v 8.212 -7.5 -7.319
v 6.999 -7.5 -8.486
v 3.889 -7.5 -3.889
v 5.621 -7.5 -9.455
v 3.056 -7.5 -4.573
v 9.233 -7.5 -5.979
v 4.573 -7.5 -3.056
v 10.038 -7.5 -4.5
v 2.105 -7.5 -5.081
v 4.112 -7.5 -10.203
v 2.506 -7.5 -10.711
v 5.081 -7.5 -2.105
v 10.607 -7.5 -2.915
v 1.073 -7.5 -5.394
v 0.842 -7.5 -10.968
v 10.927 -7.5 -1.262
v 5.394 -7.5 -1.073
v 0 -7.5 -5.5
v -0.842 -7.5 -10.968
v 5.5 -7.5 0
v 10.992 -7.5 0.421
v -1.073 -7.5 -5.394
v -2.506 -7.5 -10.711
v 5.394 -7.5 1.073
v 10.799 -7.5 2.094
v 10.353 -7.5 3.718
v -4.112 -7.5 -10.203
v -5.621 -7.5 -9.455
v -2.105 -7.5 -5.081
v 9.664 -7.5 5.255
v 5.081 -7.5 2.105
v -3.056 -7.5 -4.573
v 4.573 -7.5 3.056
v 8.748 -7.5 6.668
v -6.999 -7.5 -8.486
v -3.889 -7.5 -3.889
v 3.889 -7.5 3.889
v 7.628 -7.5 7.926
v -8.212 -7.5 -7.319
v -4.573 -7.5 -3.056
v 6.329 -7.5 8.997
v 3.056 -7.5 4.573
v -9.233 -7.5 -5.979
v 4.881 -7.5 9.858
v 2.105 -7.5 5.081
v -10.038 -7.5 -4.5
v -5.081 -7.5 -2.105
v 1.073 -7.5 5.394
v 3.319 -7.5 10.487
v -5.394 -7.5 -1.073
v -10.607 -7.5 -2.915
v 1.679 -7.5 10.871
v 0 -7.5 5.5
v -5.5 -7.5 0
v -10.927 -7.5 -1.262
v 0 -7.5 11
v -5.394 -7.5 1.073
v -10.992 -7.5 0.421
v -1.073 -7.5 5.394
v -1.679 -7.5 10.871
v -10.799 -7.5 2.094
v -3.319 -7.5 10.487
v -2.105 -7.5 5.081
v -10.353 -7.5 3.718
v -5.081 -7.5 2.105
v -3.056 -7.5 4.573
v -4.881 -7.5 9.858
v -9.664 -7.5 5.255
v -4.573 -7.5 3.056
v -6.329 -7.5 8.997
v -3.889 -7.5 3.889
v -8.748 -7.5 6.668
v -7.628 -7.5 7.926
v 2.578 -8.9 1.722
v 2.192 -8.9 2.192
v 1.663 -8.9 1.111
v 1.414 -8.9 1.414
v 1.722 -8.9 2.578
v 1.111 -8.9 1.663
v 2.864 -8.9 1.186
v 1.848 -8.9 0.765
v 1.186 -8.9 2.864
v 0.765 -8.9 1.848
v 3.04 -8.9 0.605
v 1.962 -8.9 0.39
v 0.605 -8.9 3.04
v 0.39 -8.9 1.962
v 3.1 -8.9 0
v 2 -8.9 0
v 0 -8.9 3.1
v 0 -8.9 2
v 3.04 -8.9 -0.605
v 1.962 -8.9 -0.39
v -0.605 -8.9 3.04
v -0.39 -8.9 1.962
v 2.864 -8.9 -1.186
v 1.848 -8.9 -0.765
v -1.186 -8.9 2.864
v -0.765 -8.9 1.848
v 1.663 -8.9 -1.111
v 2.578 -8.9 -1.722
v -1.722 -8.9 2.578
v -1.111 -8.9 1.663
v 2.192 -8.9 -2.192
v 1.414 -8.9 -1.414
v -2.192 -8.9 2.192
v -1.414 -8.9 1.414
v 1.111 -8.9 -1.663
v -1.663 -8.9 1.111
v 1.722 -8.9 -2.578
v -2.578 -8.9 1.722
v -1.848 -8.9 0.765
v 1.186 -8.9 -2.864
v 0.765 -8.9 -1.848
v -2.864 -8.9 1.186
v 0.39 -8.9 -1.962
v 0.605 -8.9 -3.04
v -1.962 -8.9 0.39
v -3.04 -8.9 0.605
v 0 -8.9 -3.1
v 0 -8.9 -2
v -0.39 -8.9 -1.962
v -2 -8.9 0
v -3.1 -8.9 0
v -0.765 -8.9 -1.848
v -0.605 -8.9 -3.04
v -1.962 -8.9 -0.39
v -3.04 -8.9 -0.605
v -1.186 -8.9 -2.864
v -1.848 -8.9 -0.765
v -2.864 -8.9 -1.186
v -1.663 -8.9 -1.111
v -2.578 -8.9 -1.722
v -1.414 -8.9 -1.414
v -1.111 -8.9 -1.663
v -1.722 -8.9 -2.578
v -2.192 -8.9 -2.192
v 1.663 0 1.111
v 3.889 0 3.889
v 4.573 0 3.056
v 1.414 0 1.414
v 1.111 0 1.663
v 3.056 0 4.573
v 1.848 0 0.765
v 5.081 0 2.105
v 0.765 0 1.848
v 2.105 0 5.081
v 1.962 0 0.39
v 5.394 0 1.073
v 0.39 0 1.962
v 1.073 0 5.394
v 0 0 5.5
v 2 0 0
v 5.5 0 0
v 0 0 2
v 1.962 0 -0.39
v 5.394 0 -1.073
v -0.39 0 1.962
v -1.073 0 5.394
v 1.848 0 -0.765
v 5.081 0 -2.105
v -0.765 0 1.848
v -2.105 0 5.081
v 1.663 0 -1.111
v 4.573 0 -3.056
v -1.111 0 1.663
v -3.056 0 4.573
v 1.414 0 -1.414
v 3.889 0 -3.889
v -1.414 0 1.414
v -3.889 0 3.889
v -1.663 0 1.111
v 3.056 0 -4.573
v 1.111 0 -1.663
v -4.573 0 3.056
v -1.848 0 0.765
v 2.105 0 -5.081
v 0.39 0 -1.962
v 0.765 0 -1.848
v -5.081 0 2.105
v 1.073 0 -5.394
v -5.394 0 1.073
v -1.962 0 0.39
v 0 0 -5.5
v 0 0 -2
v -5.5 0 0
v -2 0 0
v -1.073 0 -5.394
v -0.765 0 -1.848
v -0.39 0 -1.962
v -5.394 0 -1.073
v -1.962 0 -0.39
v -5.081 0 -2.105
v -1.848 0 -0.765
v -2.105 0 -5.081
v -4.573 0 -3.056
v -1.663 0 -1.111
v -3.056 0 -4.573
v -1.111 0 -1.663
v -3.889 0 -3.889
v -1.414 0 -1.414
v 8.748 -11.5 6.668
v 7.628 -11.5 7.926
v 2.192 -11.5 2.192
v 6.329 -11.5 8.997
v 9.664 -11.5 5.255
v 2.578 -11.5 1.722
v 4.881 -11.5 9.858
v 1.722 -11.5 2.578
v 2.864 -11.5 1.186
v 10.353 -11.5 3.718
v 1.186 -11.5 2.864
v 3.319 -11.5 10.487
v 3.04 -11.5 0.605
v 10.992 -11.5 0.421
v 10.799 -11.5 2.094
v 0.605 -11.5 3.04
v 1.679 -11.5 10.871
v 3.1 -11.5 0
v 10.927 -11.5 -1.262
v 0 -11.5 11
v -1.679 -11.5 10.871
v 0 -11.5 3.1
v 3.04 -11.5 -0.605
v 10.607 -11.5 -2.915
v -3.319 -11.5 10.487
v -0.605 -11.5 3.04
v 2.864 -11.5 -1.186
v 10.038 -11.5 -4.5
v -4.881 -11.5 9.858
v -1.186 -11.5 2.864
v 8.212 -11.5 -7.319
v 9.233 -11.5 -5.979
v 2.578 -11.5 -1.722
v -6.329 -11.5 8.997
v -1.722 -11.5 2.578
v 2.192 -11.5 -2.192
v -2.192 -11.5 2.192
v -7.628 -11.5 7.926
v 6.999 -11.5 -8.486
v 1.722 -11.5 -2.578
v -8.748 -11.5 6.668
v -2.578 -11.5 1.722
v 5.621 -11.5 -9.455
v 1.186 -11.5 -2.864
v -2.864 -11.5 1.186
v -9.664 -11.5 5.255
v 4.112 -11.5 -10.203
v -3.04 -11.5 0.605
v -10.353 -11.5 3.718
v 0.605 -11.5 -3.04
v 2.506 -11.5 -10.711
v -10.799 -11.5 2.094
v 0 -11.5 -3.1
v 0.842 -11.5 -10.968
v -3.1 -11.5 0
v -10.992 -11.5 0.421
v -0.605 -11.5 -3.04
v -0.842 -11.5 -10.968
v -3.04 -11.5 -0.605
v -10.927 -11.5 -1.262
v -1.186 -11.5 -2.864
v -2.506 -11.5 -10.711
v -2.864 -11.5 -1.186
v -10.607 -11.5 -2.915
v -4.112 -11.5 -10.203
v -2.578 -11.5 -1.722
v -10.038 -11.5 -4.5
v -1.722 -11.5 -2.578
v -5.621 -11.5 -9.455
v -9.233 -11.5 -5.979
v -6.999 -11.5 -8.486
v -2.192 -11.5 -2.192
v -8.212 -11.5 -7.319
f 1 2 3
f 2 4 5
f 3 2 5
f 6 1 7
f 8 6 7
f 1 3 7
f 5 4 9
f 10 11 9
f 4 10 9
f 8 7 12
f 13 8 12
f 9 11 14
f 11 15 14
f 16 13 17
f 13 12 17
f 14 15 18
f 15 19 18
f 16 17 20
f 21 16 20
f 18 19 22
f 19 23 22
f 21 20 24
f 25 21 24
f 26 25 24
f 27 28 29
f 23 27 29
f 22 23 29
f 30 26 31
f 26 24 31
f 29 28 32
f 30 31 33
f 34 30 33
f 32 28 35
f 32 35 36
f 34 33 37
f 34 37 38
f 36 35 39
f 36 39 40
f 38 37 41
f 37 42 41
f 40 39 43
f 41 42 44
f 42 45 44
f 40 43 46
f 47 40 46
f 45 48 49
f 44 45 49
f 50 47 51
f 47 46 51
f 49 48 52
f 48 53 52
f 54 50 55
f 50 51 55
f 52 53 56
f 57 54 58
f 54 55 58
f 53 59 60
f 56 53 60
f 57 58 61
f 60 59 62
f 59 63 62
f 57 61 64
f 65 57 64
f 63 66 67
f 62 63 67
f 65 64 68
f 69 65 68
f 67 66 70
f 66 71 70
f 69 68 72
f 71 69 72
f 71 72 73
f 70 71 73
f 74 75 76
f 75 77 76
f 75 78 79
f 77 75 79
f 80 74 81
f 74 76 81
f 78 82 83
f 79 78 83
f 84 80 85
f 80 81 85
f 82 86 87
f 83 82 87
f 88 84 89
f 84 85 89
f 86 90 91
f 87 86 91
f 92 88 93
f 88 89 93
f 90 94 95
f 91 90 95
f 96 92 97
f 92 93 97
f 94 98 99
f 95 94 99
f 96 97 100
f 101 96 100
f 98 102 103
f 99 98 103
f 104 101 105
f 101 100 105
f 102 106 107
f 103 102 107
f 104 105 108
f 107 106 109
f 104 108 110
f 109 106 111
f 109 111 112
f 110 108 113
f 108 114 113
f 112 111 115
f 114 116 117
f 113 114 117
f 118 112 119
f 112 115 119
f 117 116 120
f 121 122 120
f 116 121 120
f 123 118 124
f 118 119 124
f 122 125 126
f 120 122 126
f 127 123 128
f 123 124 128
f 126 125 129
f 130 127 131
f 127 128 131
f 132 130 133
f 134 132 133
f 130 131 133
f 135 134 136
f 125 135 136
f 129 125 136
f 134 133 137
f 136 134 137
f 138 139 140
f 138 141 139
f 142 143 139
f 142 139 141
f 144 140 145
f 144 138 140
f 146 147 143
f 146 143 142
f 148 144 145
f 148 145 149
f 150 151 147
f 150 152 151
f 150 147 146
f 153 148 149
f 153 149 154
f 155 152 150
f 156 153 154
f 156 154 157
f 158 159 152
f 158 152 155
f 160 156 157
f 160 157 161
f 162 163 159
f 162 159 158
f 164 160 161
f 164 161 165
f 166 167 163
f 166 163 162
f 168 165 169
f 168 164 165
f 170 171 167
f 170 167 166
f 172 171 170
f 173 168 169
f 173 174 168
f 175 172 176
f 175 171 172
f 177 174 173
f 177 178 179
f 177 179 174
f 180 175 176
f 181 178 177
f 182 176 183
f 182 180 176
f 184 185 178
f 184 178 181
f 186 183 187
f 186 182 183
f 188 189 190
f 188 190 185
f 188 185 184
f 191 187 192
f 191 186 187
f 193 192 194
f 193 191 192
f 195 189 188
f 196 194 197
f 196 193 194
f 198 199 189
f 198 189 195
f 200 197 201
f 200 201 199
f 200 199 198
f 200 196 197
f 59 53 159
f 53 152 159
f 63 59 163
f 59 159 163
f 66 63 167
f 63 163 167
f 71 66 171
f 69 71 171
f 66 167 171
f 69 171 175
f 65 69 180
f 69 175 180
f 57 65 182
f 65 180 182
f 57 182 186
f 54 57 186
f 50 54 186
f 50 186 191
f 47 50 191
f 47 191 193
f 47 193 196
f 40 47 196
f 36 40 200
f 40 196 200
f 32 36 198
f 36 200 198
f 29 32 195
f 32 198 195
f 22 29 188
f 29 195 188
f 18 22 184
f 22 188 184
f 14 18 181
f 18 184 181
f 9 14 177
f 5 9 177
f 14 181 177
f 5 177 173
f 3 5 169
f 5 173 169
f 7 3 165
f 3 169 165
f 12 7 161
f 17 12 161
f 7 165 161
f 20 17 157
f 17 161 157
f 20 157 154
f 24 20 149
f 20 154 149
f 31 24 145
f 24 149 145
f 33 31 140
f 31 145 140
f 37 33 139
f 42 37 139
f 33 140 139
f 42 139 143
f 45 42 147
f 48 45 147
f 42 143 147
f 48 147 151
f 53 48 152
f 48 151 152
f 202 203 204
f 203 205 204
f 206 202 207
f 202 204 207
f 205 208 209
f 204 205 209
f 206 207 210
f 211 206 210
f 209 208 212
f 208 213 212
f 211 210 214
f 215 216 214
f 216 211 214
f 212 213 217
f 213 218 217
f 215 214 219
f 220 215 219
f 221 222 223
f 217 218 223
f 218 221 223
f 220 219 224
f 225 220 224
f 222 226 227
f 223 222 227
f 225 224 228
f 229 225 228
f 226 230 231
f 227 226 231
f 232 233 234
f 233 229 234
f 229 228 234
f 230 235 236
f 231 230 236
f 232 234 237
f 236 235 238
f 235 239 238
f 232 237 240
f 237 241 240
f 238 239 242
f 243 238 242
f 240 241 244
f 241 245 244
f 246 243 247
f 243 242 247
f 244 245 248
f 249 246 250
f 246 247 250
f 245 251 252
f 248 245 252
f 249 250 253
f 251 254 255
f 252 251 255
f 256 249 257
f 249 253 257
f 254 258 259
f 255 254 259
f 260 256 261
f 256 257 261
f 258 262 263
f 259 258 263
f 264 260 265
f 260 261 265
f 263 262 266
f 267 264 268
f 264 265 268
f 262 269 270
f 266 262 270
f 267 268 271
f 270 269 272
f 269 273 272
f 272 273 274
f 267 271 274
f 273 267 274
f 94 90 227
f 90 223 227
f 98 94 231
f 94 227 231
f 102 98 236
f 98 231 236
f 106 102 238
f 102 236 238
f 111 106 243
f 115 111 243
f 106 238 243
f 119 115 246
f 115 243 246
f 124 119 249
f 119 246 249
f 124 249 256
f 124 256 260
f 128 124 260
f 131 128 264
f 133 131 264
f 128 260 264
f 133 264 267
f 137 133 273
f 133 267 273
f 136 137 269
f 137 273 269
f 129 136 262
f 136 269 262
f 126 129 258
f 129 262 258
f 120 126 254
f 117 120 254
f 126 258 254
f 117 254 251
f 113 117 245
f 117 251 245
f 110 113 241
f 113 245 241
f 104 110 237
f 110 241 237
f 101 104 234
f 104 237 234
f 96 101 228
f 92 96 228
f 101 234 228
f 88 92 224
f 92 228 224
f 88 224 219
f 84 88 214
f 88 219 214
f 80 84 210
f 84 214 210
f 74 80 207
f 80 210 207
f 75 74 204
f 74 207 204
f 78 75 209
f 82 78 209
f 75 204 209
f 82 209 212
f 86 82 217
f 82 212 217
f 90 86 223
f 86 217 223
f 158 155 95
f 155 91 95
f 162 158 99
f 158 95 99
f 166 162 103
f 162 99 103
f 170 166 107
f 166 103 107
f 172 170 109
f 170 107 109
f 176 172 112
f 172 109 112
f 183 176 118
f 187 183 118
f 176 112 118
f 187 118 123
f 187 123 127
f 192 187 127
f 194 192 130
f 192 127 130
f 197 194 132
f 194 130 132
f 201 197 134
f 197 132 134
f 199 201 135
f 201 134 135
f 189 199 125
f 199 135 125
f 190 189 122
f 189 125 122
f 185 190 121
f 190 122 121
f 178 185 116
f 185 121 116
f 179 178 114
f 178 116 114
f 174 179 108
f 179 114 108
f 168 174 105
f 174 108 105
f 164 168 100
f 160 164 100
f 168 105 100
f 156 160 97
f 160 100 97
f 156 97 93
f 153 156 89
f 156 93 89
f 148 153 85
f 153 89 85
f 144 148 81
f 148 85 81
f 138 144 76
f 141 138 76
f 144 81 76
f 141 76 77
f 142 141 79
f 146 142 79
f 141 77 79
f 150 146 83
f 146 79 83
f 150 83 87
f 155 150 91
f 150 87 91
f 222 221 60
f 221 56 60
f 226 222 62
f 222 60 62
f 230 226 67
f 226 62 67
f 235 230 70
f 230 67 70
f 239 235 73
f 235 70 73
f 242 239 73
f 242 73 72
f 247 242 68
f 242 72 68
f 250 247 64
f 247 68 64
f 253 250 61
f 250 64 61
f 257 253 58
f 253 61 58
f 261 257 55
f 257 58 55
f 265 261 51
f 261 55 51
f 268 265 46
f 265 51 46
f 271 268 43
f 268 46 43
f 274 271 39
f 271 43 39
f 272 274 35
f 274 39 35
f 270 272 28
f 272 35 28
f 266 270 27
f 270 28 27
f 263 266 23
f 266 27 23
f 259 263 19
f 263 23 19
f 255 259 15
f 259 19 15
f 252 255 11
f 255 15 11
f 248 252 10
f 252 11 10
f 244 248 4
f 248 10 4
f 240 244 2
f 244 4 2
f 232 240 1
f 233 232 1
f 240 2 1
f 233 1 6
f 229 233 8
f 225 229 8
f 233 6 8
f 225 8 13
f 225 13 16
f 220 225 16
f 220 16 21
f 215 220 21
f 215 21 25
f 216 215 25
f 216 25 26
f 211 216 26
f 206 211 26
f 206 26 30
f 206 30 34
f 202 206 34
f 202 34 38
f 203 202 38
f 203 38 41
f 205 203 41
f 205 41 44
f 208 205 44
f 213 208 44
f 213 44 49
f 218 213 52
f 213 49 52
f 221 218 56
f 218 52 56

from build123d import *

# Parameters (mm, degrees)
SKETCH_1_W = 3.5
SKETCH_1_H = 7.5


with BuildPart() as part:
    # 草图1 → 旋转1 (revolve)
    with BuildSketch(Plane(origin=(0, 0, 0), x_dir=(0, 0, -1), z_dir=(1, 0, 0)), mode=Mode.PRIVATE) as revolve_1_sk:
        with Locations((3.75, -3.75)):
            Rectangle(SKETCH_1_W, SKETCH_1_H)
        Polygon((5.5, -7.5), (2, -7.5), (2, -8.9), (3.1, -8.9), (3.1, -11.5), (11, -11.5), (11, -7.5), align=None)
    revolve(revolve_1_sk.sketch.rotate(Axis((0, 0, 0), (0, -1, 0)), 180), axis=Axis((0, 0, 0), (0, -1, 0)))


solid = part.part
